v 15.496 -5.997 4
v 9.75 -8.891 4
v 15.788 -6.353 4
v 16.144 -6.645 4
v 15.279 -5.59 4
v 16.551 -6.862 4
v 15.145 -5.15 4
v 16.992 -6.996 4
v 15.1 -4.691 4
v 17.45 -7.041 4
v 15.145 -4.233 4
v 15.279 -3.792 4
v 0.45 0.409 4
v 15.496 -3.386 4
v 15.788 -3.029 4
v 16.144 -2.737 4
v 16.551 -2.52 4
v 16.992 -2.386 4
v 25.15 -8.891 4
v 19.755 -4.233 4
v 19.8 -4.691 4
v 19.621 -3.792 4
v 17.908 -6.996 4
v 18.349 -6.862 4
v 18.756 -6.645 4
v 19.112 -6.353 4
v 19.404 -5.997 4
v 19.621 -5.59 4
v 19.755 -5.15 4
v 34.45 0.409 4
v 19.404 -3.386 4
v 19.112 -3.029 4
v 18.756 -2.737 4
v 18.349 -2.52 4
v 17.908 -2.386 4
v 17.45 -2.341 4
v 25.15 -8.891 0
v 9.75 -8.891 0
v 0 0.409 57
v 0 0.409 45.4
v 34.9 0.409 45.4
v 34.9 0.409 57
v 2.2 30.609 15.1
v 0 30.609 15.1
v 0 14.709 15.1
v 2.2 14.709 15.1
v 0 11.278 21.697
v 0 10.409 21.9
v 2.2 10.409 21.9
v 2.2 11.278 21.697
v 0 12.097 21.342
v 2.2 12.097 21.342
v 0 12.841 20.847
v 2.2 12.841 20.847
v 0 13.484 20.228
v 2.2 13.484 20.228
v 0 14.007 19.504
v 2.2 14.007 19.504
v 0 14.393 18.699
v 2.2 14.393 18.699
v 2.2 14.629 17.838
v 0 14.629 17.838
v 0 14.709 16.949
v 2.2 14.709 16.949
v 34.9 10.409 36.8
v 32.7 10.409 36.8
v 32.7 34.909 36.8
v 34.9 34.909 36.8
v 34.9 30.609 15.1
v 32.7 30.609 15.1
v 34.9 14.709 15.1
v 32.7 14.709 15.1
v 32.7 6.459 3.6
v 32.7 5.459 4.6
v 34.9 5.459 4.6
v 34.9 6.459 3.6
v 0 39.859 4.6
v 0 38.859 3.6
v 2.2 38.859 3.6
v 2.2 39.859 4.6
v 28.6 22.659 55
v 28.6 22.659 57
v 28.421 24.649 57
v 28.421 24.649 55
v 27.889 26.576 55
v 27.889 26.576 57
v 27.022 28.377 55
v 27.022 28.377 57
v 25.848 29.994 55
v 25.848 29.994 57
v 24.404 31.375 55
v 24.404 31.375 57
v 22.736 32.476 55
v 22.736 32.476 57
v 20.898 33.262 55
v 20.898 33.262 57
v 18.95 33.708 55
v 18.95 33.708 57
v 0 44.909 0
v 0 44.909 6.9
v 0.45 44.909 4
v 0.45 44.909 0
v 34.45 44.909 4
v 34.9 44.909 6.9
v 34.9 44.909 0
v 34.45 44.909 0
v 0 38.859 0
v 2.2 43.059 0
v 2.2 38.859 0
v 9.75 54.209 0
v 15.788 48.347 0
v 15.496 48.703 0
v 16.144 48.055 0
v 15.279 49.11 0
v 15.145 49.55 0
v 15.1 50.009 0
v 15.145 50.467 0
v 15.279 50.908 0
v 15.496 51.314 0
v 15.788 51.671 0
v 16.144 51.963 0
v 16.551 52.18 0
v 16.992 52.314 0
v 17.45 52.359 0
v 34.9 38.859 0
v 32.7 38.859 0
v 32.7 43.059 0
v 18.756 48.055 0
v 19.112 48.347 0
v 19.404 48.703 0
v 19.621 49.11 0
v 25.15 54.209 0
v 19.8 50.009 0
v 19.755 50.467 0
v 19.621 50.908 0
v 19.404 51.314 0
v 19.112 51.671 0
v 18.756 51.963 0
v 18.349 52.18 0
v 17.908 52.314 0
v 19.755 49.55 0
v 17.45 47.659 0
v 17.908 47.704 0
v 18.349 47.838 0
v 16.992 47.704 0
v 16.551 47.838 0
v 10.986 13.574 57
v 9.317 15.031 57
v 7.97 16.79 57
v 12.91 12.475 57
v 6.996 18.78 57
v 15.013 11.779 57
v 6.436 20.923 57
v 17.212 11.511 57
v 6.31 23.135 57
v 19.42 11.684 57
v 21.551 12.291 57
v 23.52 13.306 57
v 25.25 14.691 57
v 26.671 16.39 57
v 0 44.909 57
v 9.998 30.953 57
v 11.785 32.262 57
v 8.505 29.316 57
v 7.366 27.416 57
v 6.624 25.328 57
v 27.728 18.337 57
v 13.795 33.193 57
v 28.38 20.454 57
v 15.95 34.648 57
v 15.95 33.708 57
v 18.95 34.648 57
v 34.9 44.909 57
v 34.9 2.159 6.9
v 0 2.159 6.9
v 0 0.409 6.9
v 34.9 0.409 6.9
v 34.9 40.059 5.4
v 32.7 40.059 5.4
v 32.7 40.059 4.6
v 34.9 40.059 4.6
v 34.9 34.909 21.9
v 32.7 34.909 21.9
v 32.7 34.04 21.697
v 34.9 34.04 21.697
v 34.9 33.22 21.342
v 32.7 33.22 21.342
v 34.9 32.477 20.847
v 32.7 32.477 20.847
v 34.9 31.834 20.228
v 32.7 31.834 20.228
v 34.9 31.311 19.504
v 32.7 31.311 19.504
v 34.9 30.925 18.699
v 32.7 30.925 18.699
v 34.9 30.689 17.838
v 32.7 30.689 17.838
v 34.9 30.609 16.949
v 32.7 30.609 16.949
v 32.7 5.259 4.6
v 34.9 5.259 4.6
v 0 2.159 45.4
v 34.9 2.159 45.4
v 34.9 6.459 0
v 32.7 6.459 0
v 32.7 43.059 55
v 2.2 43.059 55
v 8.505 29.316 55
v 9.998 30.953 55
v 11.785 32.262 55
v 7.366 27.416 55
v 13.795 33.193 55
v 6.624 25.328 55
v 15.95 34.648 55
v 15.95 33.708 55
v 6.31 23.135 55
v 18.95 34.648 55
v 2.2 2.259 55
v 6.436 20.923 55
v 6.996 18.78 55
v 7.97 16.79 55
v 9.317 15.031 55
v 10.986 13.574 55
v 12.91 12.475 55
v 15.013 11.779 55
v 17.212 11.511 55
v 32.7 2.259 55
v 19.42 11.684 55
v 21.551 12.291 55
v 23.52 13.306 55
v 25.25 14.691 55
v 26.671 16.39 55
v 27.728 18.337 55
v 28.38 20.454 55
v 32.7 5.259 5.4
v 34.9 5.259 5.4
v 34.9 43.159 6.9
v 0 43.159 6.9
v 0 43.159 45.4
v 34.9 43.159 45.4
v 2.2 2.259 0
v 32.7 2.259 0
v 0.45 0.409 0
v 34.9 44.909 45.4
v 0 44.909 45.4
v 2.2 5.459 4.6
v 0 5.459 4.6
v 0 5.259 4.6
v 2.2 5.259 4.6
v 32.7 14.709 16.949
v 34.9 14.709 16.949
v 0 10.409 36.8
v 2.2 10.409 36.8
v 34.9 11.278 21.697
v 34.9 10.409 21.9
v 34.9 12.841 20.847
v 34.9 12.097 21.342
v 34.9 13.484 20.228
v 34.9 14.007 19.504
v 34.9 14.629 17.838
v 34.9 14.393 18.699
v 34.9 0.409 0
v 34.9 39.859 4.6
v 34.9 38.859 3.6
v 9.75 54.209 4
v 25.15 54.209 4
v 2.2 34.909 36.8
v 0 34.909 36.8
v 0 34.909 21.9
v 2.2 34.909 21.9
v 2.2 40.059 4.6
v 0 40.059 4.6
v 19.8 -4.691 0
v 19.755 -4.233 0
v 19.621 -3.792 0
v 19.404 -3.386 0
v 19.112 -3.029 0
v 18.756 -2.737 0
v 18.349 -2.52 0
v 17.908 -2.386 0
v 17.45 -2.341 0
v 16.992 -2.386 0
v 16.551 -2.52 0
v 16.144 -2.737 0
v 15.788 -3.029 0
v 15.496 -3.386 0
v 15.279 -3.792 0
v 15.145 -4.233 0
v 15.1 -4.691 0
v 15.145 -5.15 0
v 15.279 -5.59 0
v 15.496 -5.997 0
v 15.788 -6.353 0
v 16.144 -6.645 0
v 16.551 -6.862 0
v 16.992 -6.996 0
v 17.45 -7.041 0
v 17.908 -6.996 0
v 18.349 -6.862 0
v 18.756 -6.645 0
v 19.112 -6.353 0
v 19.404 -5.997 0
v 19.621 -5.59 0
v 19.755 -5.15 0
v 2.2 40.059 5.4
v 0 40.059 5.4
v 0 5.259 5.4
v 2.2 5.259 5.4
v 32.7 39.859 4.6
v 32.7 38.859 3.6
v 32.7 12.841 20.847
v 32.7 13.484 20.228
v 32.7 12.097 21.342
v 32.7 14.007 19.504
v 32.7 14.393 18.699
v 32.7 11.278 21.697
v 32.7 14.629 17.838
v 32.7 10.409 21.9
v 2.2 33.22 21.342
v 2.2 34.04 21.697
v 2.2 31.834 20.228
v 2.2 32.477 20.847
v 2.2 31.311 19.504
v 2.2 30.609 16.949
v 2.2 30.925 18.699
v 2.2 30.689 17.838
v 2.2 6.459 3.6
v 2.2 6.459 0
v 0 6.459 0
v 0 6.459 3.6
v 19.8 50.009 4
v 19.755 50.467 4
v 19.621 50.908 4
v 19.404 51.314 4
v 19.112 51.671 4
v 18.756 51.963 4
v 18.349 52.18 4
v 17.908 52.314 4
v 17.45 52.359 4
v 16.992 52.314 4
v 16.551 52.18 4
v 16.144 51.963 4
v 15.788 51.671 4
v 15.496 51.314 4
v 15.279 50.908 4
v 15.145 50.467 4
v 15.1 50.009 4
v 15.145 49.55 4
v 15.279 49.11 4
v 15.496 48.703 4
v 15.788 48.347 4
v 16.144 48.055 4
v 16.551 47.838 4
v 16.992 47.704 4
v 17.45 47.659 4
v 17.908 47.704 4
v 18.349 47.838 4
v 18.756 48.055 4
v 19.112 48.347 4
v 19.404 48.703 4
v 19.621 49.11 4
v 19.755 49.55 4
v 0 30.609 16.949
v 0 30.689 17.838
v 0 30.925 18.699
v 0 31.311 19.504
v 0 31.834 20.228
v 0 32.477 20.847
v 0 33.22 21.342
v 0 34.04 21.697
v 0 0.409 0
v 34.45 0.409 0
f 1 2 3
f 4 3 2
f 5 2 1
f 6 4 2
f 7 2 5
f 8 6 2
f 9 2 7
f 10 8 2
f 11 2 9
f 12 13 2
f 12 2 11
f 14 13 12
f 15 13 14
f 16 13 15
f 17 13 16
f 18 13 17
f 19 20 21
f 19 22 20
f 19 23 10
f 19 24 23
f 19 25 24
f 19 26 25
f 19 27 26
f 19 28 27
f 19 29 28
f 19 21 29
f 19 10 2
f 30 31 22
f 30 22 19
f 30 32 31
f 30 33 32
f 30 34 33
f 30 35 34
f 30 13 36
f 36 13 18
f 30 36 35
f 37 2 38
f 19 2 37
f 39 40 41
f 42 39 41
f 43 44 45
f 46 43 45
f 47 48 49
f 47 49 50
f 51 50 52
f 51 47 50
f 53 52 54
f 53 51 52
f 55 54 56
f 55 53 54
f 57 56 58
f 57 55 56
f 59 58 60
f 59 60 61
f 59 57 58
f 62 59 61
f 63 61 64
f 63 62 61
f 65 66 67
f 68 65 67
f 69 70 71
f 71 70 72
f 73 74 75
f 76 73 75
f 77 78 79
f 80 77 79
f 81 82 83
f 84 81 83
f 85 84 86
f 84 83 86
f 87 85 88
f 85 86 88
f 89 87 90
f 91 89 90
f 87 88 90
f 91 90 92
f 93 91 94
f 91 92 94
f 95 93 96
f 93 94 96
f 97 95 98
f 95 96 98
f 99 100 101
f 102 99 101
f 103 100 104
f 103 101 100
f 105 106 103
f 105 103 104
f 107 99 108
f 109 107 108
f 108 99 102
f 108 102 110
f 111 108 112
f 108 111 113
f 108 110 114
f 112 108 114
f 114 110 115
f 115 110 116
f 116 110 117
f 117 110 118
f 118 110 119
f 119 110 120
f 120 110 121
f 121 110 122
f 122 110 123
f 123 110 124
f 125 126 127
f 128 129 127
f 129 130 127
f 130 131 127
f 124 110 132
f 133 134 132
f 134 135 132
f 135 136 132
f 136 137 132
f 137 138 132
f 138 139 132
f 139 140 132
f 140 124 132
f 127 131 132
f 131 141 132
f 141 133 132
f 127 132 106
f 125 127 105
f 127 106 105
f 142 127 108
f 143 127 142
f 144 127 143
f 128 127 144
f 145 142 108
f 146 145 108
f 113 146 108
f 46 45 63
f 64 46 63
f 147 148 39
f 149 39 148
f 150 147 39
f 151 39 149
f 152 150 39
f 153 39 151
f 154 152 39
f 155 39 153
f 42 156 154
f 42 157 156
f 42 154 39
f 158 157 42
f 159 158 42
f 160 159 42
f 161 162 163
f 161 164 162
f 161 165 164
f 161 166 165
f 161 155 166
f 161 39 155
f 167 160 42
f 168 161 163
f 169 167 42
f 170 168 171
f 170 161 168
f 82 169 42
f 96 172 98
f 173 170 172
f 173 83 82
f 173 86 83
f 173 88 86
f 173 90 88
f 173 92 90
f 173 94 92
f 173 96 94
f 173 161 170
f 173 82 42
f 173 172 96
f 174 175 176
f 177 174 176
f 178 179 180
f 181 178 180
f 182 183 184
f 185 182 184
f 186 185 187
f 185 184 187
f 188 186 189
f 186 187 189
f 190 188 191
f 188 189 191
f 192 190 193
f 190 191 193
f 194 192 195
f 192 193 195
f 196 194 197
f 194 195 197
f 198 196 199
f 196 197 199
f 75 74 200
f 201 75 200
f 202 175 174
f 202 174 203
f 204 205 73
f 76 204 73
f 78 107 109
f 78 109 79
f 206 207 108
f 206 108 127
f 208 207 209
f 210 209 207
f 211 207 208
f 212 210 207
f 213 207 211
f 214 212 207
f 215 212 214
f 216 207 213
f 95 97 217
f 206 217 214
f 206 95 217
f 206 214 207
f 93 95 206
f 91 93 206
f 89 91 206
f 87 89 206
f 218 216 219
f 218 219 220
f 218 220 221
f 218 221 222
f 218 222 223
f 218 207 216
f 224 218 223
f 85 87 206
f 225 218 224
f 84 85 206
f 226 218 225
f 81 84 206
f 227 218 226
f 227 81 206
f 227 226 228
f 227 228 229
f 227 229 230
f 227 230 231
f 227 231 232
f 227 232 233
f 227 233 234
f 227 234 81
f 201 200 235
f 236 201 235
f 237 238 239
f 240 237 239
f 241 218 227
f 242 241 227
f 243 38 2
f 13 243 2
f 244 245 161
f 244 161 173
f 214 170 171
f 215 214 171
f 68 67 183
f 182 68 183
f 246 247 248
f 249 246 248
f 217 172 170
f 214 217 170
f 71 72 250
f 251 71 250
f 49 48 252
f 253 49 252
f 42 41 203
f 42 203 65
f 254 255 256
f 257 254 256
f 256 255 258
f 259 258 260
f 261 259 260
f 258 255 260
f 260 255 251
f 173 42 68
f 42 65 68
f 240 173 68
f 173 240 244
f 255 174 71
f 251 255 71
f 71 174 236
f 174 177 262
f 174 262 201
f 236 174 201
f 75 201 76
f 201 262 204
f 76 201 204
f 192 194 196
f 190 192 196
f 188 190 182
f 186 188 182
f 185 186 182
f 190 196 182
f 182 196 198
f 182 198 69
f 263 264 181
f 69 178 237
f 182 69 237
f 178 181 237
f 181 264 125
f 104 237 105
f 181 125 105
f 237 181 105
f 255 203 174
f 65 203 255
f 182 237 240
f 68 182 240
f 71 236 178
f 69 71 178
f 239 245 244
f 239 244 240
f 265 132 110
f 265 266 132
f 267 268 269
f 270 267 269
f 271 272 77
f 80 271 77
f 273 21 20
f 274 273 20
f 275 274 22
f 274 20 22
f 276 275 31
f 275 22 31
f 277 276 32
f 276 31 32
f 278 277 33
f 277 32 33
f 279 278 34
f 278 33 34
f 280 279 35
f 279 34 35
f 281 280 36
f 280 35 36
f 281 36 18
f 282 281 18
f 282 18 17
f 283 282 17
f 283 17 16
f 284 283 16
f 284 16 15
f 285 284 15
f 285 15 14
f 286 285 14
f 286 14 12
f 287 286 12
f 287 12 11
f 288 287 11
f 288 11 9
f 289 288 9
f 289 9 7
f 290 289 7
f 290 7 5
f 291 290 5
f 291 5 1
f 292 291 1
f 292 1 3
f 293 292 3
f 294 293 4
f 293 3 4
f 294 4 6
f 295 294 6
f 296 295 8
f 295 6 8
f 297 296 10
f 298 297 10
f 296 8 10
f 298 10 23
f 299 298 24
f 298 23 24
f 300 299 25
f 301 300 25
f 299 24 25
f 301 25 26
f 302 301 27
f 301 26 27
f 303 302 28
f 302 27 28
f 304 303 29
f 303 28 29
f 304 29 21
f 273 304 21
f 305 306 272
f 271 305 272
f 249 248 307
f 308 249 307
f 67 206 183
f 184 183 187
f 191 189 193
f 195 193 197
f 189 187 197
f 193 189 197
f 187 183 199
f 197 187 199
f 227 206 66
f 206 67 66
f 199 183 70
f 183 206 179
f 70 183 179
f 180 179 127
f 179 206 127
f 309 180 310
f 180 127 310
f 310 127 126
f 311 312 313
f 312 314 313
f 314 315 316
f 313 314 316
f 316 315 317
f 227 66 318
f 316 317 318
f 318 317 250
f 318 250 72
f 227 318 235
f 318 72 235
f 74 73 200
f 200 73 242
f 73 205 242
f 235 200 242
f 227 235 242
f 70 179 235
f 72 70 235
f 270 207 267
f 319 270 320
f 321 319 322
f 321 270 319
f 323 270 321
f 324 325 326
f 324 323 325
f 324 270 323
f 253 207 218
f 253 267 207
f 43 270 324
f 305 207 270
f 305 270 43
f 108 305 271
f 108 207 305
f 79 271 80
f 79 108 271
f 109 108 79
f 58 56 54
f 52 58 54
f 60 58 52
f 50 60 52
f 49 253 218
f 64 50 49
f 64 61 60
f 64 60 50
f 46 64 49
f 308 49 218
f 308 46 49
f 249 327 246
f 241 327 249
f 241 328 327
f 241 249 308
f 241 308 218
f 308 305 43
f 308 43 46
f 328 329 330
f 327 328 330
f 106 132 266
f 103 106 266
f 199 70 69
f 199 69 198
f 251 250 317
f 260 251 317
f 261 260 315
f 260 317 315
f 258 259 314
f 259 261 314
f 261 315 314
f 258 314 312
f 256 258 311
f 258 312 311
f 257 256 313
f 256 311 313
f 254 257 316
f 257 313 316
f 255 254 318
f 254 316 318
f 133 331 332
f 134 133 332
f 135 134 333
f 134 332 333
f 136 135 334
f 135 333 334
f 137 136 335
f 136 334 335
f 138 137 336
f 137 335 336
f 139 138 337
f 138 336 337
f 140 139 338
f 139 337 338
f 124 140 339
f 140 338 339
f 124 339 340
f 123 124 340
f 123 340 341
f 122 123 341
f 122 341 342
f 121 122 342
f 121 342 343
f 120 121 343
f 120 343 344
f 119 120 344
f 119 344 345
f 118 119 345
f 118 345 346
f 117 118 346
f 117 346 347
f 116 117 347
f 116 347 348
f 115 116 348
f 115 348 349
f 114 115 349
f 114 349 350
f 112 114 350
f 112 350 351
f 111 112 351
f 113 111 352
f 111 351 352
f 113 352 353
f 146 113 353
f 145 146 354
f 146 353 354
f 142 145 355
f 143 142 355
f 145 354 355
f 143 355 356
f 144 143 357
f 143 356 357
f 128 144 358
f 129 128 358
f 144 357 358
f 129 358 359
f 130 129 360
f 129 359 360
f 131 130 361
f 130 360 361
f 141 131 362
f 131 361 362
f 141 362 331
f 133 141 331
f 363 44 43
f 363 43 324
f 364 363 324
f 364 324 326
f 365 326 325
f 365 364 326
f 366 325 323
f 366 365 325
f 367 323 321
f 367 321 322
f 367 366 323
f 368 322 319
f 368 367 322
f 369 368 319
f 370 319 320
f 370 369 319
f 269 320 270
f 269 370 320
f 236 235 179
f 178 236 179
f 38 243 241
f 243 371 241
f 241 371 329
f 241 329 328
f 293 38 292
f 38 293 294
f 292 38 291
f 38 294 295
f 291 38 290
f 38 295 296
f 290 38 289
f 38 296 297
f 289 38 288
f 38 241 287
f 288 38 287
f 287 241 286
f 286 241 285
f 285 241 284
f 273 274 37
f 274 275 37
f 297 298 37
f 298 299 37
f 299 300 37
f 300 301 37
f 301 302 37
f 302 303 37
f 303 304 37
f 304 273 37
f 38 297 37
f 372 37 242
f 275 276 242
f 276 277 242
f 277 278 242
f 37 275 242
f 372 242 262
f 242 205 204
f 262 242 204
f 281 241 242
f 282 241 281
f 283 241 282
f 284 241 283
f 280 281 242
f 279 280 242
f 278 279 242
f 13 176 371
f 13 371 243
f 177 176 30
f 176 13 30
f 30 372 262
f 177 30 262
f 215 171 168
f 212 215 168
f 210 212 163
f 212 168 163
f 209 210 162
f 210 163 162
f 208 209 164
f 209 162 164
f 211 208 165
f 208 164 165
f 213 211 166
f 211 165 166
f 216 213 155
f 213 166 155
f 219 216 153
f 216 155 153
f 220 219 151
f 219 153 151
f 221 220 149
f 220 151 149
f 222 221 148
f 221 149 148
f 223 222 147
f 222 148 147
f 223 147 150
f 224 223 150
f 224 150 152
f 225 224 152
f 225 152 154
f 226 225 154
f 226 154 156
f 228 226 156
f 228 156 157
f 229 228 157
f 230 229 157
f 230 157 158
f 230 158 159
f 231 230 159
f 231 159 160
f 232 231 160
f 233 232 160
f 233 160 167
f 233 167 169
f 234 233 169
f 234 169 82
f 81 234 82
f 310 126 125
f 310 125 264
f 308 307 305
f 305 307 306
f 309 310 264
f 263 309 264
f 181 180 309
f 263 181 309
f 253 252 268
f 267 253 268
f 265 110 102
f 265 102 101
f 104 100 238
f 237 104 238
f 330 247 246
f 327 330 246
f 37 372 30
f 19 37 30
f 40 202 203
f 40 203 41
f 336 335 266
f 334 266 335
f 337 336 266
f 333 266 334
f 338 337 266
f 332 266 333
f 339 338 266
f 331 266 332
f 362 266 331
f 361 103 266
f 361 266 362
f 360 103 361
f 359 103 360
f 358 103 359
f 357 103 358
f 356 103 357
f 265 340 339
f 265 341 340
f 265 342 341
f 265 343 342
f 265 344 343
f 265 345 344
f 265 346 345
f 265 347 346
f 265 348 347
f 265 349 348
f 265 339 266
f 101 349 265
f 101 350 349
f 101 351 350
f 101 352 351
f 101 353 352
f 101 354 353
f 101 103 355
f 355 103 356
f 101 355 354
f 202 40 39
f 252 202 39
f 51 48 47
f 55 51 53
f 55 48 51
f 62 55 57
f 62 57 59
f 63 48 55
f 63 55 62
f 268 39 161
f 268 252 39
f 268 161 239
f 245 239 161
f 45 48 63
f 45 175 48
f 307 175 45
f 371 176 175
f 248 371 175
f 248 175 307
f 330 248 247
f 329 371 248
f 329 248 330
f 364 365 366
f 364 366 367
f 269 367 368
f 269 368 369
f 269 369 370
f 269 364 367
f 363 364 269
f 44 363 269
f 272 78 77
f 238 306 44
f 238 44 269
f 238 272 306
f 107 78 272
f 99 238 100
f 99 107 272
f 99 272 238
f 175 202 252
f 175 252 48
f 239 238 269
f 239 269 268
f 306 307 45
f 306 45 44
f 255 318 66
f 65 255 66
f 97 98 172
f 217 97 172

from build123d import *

# Parameters (mm, degrees)
F0_W         = 34.9
F0_H         = 44.5
F1_DEPTH     = 57
F2_W         = 30.5
F2_H         = 40.8
F3_DEPTH     = 55
F5_DEPTH     = 57.001
F6_W         = 1.75
F6_H         = 38.5
F7_DEPTH     = 34.901
F8_W         = 15.9
F8_H         = 6.8
F8_W_2       = 32.4
F8_H_2       = 4.6
F9_DEPTH     = 34.901
F10_W        = 34
F10_H        = 4
F11_DEPTH    = 9.3
F12_W        = 34
F12_H        = 4
F13_DEPTH    = 9.3
F14_SIZE     = 9.29999
F15_SIZE     = 1
F16_R        = 2.35
F17_DEPTH    = 4.001
F18_T1_DEPTH = 26.953787589
F18_T3_DEPTH = 26.953787589


# Not quite as in the source:
# - a fillet or chamfer that OpenCascade refuses, or shapes differently, is made with other operations: its cross-section is extruded or revolved along the edge and cut away or added
# - a fillet or chamfer is up to 0.001 mm smaller than in the source, because OpenCascade refuses the exact size


with BuildPart() as f1:
    # F0 (on Top) → F1 (new body)
    with BuildSketch(Plane.XY):
        with Locations((17.45, 22.6589083523)):
            Rectangle(F0_W, F0_H)
    extrude(amount=F1_DEPTH)

    # F2 (on face) → F3 (cut)
    with BuildSketch(Plane(origin=(0, 0, 0), x_dir=(1, 0, 0), z_dir=(0, 0, -1))):
        with Locations((17.45, -22.6589083523)):
            Rectangle(F2_W, F2_H)
    extrude(amount=-F3_DEPTH, mode=Mode.SUBTRACT)

    # F4 (on face) → F5 (cut, through all)
    with BuildSketch(Plane.XY.offset(57)):
        with BuildLine():
            Line((18.95, 33.2867875695), (18.95, 33.7075508028))
            ThreePointArc((18.95, 33.7075508028), (17.45, 33.8089083523), (15.95, 33.7075508028))
            Line((15.95, 33.7075508028), (15.95, 33.2867875695))
            Line((15.95, 33.2867875695), (18.95, 33.2867875695))
        make_face()
        with BuildLine():
            ThreePointArc((15.95, 33.7075508028), (10.1152368818, 14.2610663676), (28.6, 22.6589083523))
            ThreePointArc((28.6, 22.6589083523), (25.8478419847, 29.9936714704), (18.95, 33.7075508028))
            Line((18.95, 33.7075508028), (18.95, 33.2867875695))
            Line((18.95, 33.2867875695), (15.95, 33.2867875695))
            Line((15.95, 33.2867875695), (15.95, 33.7075508028))
        make_face()
        with BuildLine():
            ThreePointArc((15.95, 33.7075508028), (17.45, 33.8089083523), (18.95, 33.7075508028))
            Line((18.95, 33.7075508028), (18.95, 34.6477875695))
            Line((18.95, 34.6477875695), (15.95, 34.6477875695))
            Line((15.95, 34.6477875695), (15.95, 33.7075508028))
        make_face()
    extrude(amount=-F5_DEPTH, mode=Mode.SUBTRACT)

    # F6 (on face) → F7 (cut, through all)
    with BuildSketch(Plane(origin=(0, 0, 0), x_dir=(0, -1, 0), z_dir=(-1, 0, 0))):
        with Locations((-44.0339083523, 26.15)):
            Rectangle(F6_W, F6_H)
        with Locations((-1.2839083523, 26.15)):
            Rectangle(F6_W, F6_H)
    extrude(amount=-F7_DEPTH, mode=Mode.SUBTRACT)

    # F8 (on face) → F9 (cut, through all)
    with BuildSketch(Plane(origin=(0, 0, 0), x_dir=(0, -1, 0), z_dir=(-1, 0, 0))):
        Polygon((-10.4089083523, 36.8), (-34.9089083523, 36.8), (-34.9089083523, 21.9), (-30.6089083523, 21.9), (-14.7089083523, 21.9), (-10.4089083523, 21.9), align=None)
        with Locations((-22.6589083523, 18.5)):
            Rectangle(F8_W, F8_H)
        with Locations((-22.6589083523, 2.3)):
            Rectangle(F8_W_2, F8_H_2)
        Polygon((-40.0589083523, 4.6), (-38.8589083523, 4.6), (-6.4589083523, 4.6), (-5.2589083523, 4.6), (-5.2589083523, 5.4), (-40.0589083523, 5.4), align=None)
    extrude(amount=-F9_DEPTH, mode=Mode.SUBTRACT)

    # F10 (on face) → F11 (join)
    with BuildSketch(Plane.XZ.offset(-0.4089083523)):
        with Locations((17.45, 2)):
            Rectangle(F10_W, F10_H)
    extrude(amount=F11_DEPTH)

    # F12 (on face) → F13 (join)
    with BuildSketch(Plane(origin=(0, 44.9089083523, 0), x_dir=(-1, 0, 0), z_dir=(0, 1, 0))):
        with Locations((-17.45, 2)):
            Rectangle(F12_W, F12_H)
    extrude(amount=F13_DEPTH)

    # F14 (size 9.3 in the source; OpenCascade refuses exactly that, so slightly less here)
    f14_edges = [f1.edges().sort_by_distance(p)[0] for p in [
        (34.45, 54.208908, 2),
        (0.45, 54.208908, 2),
        (34.45, -8.891092, 2),
        (0.45, -8.891092, 2),
    ]]
    chamfer(f14_edges, length=F14_SIZE)

    # F15
    f15_edges = [f1.edges().sort_by_distance(p)[0] for p in [
        (1.1, 38.858908, 4.6),
        (1.1, 6.458908, 4.6),
        (33.8, 6.458908, 4.6),
        (33.8, 38.858908, 4.6),
    ]]
    chamfer(f15_edges, length=F15_SIZE)

    # F16 (on face) → F17 (cut, through all)
    with BuildSketch(Plane.XY.offset(4)):
        with Locations((17.45, -4.6910916477)):
            Circle(F16_R)
        with Locations((17.45, 50.0089083523)):
            Circle(F16_R)
    extrude(amount=-F17_DEPTH, mode=Mode.SUBTRACT)

    # F18: fillet of radius 5 on 4 edges, made by hand

    # F18_s2 → F18_t1 (cut)
    with BuildSketch(Plane.YZ.offset(-12.3768937945)):
        with BuildLine():
            ThreePointArc((30.6089083523, 16.9492424822), (31.8339911346, 20.2279617444), (34.9089083523, 21.9))
            Line((34.9089083523, 21.9), (30.6089083523, 21.9))
            Line((30.6089083523, 21.9), (30.6089083523, 16.9492424822))
        make_face()
        with BuildLine():
            ThreePointArc((10.4089083523, 21.9), (13.4838255699, 20.2279617444), (14.7089083523, 16.9492424822))
            Line((14.7089083523, 16.9492424822), (14.7089083523, 21.9))
            Line((14.7089083523, 21.9), (10.4089083523, 21.9))
        make_face()
    extrude(amount=F18_T1_DEPTH, mode=Mode.SUBTRACT)

    # F18_s4 → F18_t3 (cut)
    with BuildSketch(Plane.YZ.offset(20.3231062055)):
        with BuildLine():
            ThreePointArc((14.7089083523, 16.9492424822), (13.4838255699, 20.2279617444), (10.4089083523, 21.9))
            Line((10.4089083523, 21.9), (14.7089083523, 21.9))
            Line((14.7089083523, 21.9), (14.7089083523, 16.9492424822))
        make_face()
        with BuildLine():
            ThreePointArc((34.9089083523, 21.9), (31.8339911346, 20.2279617444), (30.6089083523, 16.9492424822))
            Line((30.6089083523, 16.9492424822), (30.6089083523, 21.9))
            Line((30.6089083523, 21.9), (34.9089083523, 21.9))
        make_face()
    extrude(amount=F18_T3_DEPTH, mode=Mode.SUBTRACT)


solid = f1.part
